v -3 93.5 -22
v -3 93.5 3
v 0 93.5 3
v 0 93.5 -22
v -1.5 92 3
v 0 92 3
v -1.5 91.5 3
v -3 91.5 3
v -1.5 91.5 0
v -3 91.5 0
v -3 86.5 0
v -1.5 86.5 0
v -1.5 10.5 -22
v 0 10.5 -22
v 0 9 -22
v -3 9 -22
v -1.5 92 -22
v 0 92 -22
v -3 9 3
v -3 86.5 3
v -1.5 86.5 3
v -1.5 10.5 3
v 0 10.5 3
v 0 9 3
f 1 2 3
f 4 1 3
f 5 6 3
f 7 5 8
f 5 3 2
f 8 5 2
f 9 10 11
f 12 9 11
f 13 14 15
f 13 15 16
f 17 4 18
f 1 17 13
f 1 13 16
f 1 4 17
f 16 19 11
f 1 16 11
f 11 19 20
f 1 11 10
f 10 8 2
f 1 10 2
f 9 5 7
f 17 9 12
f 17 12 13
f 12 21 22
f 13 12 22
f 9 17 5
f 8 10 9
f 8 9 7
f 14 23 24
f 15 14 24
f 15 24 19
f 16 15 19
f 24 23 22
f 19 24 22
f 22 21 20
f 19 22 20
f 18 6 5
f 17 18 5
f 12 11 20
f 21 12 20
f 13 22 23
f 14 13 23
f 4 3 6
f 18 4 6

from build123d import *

# Parameters (mm, degrees)
SKETCH102_W      = 5
SKETCH102_H      = 4
EXTRUDE093_DEPTH = 5
EXTRUDE064_DEPTH = 25


with BuildPart() as extrude093:
    # Sketch102 → Extrude093 (new body)
    with BuildSketch(Plane(origin=(-4, 0, 0), x_dir=(0, -1, 0), z_dir=(-1, 0, 0))):
        with Locations((-89, 2)):
            Rectangle(SKETCH102_W, SKETCH102_H)
    extrude(amount=-EXTRUDE093_DEPTH)


with BuildPart() as cut015:
    # Sketch074 → Extrude064 (new body)
    with BuildSketch(Plane.XY.offset(3)):
        Polygon((-3, 93.5), (0, 93.5), (0, 92), (-1.5, 92), (-1.5, 10.5), (0, 10.5), (0, 9), (-3, 9), align=None)
    extrude(amount=-EXTRUDE064_DEPTH)

    # Cut015: cut Extrude093
    add(extrude093.part, mode=Mode.SUBTRACT)


solid = cut015.part
